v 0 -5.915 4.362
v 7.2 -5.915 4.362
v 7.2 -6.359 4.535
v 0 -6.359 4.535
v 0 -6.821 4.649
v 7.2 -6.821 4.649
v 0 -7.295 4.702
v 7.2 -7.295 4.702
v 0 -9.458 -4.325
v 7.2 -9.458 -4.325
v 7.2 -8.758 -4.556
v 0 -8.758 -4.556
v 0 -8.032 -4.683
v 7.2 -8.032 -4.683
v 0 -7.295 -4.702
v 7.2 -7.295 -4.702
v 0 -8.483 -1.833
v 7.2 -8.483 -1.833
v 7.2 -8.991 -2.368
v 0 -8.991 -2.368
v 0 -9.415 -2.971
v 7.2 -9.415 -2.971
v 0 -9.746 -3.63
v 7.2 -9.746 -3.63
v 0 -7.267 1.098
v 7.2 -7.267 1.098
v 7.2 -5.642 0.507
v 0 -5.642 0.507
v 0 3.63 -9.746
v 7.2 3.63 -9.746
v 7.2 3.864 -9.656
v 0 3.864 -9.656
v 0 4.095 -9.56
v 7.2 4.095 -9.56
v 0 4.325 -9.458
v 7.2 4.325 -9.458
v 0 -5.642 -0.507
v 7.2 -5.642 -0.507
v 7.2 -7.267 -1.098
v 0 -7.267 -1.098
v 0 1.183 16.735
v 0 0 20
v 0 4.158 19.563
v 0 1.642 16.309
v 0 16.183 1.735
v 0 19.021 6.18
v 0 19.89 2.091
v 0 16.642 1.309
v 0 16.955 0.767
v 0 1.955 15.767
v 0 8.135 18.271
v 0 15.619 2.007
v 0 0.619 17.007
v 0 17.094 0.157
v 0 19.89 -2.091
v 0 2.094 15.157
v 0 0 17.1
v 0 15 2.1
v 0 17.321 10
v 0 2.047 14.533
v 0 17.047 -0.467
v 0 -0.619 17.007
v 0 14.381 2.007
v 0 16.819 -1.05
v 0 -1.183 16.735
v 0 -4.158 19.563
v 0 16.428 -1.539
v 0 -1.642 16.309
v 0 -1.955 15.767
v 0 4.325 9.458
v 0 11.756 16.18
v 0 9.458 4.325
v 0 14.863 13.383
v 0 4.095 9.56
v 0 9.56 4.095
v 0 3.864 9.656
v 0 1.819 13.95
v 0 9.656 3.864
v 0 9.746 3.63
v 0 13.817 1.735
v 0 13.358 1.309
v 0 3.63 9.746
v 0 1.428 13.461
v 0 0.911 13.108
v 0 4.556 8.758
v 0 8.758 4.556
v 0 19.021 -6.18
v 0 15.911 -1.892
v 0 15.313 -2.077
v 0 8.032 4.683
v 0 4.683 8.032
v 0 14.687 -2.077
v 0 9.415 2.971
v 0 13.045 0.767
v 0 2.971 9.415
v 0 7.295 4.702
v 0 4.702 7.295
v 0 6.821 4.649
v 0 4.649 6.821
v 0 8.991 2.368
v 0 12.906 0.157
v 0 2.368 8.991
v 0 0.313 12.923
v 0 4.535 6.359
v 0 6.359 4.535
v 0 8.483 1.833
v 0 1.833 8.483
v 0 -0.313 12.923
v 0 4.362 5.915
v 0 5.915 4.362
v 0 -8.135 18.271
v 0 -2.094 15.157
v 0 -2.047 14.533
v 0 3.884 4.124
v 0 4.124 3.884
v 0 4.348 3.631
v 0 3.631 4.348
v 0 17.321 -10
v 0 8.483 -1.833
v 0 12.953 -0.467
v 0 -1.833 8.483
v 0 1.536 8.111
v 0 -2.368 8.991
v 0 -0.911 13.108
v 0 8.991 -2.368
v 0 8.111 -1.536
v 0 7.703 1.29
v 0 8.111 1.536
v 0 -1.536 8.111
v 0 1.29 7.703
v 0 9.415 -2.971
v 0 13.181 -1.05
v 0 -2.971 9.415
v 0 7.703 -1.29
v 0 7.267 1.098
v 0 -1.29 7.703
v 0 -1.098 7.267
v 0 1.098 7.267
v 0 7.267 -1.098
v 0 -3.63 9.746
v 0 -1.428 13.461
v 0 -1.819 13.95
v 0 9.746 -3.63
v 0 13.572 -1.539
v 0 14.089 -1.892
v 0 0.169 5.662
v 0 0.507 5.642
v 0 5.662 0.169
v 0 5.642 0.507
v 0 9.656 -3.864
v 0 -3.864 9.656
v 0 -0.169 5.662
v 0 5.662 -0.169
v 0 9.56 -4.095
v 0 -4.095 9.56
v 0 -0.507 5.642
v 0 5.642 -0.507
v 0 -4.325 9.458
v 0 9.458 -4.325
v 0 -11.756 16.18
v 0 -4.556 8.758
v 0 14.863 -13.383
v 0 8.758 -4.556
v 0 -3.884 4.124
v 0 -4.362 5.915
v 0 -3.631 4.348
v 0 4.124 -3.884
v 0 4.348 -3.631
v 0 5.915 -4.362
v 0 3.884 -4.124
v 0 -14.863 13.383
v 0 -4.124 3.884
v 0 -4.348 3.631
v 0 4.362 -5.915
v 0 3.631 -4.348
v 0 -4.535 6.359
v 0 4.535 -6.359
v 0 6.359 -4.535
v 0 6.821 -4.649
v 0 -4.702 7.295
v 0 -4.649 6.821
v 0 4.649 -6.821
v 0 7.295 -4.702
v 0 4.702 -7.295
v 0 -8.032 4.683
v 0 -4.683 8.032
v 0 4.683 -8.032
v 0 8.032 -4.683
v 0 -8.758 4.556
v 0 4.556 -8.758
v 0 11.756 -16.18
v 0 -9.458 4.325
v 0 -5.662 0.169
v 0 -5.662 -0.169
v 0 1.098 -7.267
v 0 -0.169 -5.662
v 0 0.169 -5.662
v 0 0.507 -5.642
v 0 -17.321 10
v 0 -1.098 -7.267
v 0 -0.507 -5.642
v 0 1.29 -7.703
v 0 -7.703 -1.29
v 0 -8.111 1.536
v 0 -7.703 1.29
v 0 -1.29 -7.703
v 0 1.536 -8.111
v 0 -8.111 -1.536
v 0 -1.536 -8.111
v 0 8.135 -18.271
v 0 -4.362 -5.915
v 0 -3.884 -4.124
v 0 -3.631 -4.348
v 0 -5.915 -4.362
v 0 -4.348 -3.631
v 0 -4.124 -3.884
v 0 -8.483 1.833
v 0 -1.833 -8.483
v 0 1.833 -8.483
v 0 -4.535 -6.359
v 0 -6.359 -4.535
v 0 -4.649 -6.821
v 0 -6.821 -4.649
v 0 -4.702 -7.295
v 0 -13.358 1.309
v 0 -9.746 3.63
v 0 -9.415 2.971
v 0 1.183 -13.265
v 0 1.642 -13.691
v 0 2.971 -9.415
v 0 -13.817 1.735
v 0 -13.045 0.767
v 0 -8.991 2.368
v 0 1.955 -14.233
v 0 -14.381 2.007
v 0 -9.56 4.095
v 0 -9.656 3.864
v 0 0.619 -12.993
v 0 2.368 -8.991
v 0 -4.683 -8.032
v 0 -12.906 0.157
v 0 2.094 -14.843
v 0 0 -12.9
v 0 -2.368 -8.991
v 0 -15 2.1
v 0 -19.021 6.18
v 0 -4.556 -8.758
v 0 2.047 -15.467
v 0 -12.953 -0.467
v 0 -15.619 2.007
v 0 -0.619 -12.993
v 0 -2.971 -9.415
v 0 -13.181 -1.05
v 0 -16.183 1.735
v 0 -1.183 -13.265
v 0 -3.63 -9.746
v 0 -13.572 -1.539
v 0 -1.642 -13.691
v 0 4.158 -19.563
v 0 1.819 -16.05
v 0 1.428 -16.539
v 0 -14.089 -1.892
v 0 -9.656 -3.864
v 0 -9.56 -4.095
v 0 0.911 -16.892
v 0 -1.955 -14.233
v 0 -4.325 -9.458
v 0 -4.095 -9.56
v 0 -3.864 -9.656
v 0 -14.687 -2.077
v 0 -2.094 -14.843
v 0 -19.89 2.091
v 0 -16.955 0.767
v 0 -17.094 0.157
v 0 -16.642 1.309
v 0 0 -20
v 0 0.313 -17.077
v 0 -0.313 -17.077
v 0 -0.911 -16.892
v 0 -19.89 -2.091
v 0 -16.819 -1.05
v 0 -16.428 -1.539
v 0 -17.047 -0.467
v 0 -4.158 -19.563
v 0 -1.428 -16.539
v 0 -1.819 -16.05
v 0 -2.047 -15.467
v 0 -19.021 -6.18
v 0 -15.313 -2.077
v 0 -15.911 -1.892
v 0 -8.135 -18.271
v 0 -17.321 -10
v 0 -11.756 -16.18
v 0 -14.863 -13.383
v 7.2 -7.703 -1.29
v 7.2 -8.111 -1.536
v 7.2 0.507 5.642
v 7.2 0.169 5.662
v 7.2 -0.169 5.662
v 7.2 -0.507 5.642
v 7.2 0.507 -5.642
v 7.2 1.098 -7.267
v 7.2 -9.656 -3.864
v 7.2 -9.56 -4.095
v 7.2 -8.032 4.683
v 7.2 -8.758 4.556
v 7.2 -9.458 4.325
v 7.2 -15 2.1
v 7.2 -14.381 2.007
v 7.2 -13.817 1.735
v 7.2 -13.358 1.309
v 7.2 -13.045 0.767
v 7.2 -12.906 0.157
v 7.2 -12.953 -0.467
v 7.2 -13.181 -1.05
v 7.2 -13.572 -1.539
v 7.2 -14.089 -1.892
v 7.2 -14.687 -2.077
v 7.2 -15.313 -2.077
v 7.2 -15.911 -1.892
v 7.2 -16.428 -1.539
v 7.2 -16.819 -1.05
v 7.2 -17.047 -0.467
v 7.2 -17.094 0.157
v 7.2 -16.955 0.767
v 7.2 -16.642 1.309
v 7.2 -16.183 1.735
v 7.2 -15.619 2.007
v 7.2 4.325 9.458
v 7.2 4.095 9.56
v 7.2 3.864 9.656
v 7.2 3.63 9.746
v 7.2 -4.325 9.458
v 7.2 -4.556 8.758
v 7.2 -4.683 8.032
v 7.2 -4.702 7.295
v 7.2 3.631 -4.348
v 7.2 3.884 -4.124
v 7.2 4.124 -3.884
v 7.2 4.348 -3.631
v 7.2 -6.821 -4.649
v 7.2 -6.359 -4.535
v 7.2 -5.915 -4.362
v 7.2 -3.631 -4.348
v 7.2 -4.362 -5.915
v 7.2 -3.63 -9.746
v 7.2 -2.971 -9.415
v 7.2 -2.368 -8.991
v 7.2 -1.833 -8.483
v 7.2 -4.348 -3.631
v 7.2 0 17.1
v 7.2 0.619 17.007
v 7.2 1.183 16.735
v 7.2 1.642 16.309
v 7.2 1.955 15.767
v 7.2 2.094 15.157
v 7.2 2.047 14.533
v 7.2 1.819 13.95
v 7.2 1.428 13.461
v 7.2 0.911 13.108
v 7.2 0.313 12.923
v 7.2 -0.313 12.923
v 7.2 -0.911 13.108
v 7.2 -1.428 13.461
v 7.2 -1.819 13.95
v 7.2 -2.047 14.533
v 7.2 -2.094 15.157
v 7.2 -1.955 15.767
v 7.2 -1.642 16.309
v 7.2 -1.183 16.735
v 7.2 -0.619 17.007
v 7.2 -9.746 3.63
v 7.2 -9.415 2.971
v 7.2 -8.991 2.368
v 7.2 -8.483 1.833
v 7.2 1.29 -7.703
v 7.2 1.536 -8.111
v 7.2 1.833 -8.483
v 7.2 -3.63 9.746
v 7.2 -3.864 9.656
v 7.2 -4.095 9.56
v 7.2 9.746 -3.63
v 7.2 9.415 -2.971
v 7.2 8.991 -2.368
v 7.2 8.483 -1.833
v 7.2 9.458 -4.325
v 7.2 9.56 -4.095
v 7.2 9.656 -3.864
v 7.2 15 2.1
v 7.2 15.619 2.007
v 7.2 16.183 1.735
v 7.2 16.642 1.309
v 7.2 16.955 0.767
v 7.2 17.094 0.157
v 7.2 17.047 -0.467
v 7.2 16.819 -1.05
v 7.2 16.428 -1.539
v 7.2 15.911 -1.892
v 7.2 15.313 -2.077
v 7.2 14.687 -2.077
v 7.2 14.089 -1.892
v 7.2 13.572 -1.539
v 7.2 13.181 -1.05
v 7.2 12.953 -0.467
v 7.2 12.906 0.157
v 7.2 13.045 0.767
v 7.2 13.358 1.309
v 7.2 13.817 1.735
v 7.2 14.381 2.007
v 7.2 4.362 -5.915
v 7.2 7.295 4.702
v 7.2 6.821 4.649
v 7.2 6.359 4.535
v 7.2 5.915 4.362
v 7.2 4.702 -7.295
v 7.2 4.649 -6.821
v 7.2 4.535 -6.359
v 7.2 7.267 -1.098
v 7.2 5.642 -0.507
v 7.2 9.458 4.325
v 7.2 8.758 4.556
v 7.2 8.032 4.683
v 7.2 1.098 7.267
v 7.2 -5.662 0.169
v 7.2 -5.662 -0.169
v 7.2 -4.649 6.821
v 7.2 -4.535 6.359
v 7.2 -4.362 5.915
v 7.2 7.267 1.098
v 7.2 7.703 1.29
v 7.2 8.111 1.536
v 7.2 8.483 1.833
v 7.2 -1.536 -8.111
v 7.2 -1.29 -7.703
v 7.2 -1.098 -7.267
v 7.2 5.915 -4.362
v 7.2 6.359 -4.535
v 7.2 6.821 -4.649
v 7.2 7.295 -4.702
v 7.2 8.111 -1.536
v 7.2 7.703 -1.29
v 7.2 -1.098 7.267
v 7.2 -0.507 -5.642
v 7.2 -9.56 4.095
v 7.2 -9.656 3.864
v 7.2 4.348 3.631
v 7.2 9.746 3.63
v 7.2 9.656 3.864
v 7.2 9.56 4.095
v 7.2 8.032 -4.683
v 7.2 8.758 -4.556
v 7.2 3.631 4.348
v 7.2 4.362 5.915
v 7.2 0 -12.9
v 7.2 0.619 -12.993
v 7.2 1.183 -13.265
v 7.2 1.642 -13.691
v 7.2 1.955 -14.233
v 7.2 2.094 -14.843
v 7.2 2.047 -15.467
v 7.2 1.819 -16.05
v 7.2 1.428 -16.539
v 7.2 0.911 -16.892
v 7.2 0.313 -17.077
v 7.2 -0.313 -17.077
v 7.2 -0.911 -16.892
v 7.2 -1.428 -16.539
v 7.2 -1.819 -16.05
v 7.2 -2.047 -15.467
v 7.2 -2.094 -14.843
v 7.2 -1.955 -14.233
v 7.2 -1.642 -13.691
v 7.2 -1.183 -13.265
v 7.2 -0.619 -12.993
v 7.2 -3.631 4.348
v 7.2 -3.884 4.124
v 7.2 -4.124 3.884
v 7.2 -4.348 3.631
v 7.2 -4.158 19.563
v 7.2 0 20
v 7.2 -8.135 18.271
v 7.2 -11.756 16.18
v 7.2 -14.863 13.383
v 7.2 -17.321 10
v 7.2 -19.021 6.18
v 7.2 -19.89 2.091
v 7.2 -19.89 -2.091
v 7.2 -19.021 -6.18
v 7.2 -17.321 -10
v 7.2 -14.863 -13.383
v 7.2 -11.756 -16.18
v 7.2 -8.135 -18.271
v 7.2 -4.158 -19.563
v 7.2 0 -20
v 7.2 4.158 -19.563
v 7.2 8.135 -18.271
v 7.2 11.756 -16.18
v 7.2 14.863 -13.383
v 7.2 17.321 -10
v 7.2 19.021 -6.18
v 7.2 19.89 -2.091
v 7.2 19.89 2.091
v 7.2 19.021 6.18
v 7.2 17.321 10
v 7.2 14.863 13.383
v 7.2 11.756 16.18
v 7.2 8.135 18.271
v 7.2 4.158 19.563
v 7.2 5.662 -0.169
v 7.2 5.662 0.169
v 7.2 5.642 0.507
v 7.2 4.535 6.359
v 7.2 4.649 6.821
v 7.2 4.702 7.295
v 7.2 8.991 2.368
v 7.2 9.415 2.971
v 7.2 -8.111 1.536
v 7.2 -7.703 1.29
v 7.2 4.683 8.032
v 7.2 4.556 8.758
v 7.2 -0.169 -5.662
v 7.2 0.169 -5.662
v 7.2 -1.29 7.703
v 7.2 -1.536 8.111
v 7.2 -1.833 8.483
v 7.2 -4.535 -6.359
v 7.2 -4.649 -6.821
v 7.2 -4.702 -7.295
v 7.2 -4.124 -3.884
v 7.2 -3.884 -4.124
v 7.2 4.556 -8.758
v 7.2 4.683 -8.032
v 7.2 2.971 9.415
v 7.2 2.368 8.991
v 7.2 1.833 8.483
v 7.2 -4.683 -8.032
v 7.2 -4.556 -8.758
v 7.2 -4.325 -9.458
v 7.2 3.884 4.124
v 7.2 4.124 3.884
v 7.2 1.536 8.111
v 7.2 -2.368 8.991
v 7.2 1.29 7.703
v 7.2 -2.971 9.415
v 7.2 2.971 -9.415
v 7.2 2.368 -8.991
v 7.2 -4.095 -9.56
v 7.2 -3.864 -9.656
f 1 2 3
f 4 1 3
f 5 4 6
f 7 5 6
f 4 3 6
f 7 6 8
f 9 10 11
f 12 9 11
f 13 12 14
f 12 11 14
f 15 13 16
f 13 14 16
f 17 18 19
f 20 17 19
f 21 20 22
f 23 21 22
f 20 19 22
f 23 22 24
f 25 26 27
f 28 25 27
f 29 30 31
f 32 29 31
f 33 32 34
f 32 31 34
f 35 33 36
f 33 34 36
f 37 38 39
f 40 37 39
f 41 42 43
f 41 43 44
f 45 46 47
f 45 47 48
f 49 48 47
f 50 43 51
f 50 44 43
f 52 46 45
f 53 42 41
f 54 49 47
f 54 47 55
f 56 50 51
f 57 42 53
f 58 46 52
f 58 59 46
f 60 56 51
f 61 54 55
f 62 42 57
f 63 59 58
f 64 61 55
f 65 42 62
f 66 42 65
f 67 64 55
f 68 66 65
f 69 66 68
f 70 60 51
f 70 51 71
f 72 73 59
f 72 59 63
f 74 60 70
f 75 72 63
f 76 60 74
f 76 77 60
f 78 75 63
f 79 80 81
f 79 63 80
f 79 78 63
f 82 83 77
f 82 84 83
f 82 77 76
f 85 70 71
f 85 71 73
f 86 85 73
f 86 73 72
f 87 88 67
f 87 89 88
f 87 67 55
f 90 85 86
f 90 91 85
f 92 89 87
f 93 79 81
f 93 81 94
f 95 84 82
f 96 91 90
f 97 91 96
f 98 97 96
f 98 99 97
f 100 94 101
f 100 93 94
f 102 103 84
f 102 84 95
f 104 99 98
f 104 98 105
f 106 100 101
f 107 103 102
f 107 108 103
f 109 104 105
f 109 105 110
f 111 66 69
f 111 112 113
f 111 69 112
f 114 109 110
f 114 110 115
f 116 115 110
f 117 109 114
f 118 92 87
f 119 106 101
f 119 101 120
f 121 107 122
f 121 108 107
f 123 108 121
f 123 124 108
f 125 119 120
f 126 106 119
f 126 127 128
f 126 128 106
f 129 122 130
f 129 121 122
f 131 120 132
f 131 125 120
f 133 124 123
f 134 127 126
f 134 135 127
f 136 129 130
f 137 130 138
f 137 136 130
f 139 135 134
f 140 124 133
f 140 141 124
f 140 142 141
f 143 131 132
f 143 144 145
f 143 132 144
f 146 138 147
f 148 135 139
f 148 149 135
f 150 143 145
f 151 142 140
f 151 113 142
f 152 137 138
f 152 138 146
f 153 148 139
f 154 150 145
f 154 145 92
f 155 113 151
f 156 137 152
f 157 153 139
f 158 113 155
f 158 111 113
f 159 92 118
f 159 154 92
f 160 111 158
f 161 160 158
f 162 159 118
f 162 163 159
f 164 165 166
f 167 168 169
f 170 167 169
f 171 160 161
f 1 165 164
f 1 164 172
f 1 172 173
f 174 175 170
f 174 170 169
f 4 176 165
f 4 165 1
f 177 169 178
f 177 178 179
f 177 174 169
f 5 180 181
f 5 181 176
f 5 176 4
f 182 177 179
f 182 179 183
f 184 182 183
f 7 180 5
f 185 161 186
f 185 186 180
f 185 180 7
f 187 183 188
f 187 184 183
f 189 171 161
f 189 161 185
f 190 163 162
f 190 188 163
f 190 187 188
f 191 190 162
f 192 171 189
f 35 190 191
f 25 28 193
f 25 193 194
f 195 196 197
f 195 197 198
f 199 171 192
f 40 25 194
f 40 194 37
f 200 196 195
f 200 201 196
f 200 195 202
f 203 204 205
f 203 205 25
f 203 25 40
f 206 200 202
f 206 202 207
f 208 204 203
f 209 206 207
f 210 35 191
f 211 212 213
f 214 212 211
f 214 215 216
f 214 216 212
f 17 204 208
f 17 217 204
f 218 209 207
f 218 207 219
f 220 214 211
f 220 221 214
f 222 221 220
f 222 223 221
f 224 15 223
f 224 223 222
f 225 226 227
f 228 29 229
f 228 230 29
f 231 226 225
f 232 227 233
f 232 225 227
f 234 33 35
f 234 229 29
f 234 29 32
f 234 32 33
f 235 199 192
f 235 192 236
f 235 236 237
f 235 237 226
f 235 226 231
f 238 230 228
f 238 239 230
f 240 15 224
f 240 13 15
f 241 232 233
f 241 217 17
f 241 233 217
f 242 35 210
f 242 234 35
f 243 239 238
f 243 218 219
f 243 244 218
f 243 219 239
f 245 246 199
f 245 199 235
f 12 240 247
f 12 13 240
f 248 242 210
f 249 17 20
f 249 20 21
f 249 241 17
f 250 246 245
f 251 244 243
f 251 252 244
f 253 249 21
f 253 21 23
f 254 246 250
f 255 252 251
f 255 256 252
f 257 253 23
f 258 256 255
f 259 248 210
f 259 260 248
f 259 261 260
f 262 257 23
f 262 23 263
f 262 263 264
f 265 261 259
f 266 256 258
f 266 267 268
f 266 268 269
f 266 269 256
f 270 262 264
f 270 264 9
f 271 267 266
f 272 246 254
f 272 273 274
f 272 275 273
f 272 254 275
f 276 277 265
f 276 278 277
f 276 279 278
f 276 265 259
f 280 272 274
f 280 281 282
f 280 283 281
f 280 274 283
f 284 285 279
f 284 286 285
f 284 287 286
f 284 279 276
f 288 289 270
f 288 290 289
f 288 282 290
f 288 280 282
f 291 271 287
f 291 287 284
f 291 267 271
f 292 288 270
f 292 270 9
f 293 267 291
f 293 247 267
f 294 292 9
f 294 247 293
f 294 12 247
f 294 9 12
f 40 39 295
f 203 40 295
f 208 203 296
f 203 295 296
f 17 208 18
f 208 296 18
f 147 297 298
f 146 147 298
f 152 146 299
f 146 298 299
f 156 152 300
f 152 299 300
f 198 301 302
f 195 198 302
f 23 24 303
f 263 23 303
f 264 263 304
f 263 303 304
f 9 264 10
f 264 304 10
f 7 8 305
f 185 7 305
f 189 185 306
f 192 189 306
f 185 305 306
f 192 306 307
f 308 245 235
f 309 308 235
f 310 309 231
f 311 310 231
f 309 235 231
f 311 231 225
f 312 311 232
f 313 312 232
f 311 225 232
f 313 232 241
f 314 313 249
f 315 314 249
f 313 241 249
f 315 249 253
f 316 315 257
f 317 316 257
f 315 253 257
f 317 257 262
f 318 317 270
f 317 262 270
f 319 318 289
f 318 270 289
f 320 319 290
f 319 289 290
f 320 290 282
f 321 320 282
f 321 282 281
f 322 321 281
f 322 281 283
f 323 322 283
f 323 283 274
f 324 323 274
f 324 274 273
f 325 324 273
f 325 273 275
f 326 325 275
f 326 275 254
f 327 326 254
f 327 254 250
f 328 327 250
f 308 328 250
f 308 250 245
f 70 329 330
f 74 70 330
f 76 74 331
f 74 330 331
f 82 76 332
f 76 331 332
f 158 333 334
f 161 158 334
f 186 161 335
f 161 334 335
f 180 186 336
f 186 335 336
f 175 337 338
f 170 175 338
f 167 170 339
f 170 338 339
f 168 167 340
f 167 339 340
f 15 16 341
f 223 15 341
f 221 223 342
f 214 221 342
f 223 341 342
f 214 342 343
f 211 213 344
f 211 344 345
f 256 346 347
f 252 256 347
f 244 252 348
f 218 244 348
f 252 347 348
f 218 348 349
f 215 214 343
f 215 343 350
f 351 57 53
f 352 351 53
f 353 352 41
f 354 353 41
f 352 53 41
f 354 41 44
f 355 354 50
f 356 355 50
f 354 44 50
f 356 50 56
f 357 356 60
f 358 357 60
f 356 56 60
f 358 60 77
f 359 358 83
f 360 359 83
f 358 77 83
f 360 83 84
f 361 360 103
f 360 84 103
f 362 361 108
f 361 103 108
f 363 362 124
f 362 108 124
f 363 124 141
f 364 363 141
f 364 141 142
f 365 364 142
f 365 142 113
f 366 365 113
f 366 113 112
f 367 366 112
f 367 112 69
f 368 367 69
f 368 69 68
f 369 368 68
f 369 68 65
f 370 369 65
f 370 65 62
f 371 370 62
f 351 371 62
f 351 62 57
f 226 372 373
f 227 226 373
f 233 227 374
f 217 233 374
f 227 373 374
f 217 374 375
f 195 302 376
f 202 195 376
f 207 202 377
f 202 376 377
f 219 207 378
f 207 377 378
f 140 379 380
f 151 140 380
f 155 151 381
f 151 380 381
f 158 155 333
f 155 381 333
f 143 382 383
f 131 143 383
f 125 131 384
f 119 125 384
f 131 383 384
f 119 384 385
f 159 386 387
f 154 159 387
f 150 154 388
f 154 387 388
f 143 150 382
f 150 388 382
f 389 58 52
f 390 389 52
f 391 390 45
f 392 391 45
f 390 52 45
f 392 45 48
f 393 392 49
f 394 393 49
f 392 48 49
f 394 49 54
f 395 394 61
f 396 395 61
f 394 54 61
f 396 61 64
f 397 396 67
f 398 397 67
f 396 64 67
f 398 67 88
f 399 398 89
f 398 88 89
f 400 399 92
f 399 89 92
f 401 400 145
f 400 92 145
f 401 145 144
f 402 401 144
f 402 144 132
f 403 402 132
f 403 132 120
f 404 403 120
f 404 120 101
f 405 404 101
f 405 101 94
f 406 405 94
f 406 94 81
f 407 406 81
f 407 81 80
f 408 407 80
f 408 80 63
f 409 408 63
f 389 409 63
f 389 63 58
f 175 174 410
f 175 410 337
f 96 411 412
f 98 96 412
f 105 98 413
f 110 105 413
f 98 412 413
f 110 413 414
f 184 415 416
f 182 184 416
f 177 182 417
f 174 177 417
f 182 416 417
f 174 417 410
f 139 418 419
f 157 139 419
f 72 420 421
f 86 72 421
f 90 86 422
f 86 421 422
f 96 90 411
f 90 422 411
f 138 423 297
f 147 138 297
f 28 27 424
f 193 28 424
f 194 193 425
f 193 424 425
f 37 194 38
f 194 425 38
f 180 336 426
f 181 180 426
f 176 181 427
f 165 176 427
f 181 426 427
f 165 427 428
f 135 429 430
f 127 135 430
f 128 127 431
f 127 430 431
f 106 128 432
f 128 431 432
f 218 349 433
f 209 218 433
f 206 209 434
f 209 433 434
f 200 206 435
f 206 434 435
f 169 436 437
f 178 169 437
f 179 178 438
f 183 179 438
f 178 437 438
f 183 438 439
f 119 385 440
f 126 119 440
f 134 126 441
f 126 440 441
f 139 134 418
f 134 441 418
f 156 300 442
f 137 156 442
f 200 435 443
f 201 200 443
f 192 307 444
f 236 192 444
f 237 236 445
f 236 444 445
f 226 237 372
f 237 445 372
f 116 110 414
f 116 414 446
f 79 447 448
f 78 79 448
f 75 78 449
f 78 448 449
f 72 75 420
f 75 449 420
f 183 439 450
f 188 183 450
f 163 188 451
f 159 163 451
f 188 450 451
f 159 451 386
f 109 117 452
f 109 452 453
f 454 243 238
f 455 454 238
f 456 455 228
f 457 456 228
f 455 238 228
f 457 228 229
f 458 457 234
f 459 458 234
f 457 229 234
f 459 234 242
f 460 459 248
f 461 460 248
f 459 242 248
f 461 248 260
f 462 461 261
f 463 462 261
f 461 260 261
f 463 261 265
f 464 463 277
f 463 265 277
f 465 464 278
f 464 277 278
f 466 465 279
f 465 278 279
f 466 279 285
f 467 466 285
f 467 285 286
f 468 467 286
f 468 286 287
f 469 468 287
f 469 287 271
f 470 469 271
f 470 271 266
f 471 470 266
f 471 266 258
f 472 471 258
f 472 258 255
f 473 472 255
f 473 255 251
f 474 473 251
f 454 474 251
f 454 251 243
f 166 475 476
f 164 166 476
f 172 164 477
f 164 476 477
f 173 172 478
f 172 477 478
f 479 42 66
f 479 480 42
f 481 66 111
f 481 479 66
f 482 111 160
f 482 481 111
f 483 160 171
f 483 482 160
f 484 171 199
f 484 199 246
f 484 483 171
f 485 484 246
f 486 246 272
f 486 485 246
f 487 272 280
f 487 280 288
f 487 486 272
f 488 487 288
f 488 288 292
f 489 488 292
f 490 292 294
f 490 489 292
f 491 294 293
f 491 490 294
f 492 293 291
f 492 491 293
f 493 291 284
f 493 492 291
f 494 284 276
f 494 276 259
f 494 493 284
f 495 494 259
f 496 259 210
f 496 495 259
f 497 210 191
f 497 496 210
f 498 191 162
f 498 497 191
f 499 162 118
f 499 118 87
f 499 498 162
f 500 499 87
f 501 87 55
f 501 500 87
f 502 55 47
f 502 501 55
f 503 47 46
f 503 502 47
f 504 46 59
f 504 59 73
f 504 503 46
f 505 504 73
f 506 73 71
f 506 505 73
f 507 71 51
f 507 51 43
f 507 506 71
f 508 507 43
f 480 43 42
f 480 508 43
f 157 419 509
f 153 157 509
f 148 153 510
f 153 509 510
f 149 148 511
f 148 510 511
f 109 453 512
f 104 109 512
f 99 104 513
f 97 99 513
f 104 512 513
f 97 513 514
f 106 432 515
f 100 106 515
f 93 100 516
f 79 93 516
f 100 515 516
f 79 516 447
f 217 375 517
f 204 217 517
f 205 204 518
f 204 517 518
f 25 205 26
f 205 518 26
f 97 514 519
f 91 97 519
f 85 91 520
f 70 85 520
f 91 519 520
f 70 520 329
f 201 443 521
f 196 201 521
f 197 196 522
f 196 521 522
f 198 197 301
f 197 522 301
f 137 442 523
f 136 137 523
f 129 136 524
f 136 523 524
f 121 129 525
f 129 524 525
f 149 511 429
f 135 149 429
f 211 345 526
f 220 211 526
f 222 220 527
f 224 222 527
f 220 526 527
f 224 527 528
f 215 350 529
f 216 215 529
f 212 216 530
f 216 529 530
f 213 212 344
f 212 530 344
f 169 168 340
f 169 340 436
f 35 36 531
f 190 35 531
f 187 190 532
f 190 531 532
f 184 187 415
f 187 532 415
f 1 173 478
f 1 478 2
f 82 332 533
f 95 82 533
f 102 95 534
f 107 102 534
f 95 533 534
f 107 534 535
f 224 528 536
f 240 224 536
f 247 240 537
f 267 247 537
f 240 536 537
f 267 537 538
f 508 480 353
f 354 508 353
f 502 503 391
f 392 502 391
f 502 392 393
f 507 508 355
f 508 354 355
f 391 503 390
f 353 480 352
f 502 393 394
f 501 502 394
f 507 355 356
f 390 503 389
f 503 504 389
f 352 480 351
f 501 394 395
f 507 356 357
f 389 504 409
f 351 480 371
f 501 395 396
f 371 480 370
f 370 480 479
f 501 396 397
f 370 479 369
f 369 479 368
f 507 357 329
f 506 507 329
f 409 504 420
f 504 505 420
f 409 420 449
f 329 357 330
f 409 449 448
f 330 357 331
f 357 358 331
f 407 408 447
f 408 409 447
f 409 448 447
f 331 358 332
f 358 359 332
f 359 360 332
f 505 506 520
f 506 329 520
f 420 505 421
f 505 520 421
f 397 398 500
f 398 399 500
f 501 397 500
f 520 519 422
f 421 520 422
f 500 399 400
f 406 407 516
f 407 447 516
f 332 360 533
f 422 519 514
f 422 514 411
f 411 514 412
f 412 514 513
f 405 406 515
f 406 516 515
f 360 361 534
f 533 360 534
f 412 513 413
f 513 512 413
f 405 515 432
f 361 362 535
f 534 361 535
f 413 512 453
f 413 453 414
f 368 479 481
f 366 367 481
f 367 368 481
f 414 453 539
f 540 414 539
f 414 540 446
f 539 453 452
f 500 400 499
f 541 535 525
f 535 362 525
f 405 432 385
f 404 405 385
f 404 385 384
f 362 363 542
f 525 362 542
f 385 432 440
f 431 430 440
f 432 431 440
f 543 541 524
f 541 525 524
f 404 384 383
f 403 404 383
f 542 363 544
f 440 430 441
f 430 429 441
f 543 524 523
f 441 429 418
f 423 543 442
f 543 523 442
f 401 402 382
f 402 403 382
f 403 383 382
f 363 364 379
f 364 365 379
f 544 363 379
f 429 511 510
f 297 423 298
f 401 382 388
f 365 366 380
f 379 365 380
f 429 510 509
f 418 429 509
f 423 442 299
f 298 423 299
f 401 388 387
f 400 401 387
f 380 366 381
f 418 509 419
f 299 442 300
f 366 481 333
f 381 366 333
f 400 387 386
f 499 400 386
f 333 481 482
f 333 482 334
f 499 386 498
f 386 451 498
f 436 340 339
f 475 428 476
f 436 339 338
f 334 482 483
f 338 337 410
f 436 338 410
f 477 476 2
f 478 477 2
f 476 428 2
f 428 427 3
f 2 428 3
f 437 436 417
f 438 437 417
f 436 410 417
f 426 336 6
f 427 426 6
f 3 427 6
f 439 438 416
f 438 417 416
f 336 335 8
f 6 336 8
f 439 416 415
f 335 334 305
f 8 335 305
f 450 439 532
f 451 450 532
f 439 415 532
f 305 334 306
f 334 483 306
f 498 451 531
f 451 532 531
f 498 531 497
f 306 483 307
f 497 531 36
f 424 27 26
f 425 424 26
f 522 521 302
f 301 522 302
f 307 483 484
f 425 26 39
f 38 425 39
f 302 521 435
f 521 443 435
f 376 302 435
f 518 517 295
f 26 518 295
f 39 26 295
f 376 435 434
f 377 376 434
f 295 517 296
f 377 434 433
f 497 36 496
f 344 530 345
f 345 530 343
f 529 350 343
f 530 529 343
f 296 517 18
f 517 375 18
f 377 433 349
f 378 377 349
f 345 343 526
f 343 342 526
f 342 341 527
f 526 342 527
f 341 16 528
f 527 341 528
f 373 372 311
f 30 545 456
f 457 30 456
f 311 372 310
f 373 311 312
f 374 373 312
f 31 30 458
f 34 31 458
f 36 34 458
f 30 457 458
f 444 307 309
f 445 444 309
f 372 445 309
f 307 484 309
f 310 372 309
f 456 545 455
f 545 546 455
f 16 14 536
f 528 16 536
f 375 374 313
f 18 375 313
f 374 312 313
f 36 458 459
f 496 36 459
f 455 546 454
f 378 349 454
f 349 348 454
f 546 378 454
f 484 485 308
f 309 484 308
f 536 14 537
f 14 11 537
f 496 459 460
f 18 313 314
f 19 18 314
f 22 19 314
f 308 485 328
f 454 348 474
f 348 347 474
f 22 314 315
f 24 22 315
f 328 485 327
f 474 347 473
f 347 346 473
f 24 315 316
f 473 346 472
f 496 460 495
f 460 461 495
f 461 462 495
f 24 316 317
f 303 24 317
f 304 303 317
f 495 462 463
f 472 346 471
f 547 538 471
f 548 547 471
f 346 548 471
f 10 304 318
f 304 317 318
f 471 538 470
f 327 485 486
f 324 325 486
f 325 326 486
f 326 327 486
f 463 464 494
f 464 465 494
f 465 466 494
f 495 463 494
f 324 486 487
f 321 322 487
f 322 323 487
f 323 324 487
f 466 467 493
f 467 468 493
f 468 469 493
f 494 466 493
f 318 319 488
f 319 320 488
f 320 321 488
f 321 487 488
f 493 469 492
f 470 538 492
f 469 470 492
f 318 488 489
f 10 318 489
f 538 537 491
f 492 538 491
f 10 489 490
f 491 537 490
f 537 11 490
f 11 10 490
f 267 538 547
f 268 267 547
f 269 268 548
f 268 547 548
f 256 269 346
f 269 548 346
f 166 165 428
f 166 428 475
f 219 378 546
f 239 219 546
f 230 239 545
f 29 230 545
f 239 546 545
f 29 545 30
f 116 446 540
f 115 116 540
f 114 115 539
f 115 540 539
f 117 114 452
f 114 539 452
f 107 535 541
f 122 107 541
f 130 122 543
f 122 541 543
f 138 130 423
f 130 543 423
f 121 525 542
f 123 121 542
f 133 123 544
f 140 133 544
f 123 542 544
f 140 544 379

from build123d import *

# Parameters (mm, degrees)
ESBO_O1_W             = 7.2
ESBO_O1_H             = 20
CORTE_EXTRUS_O2_DEPTH = 30.186298155
FURO_ROSCADO_DE_M51_D = 4.2


with BuildPart() as part:
    # Esboço1 → Revolução1 (revolve)
    with BuildSketch(Plane.XY, mode=Mode.PRIVATE) as revolu_o1_sk:
        with Locations((3.6, 10)):
            Rectangle(ESBO_O1_W, ESBO_O1_H)
    revolve(revolu_o1_sk.sketch.rotate(Axis((-35, 0, 0), (1, 0, 0)), 90), axis=Axis((-35, 0, 0), (1, 0, 0)))

    # Esboço3 → Corte-extrusão2 (cut, through all)
    with BuildSketch(Plane(origin=(7.2, 0, 0), x_dir=(0, 0, -1), z_dir=(1, 0, 0))):
        with BuildLine():
            Line((-0.506751832, 5.642289215), (-1.097919721, 7.266509641))
            ThreePointArc((-1.097919721, 7.266509641), (-1.406126414, 7.910707201), (-1.832951119, 8.483247621))
            ThreePointArc((-1.832951119, 8.483247621), (-2.661618953, 9.214061597), (-3.630088541, 9.745894376))
            ThreePointArc((-3.630088541, 9.745894376), (-3.979907697, 9.608347138), (-4.324527778, 9.458248225))
            ThreePointArc((-4.324527778, 9.458248225), (-4.633276627, 8.397374248), (-4.702469753, 7.294654085))
            ThreePointArc((-4.702469753, 7.294654085), (-4.599433183, 6.587996228), (-4.361851763, 5.914544723))
            Line((-4.361851763, 5.914544723), (-3.631373309, 4.348028622))
            ThreePointArc((-3.631373309, 4.348028622), (-4.005759915, 4.005759915), (-4.348028622, 3.631373309))
            Line((-4.348028622, 3.631373309), (-5.914544723, 4.361851763))
            ThreePointArc((-5.914544723, 4.361851763), (-6.587996228, 4.599433183), (-7.294654085, 4.702469753))
            ThreePointArc((-7.294654085, 4.702469753), (-8.397374248, 4.633276627), (-9.458248225, 4.324527778))
            ThreePointArc((-9.458248225, 4.324527778), (-9.608347138, 3.979907697), (-9.745894376, 3.630088541))
            ThreePointArc((-9.745894376, 3.630088541), (-9.214061597, 2.661618953), (-8.483247621, 1.832951119))
            ThreePointArc((-8.483247621, 1.832951119), (-7.910707201, 1.406126414), (-7.266509641, 1.097919721))
            Line((-7.266509641, 1.097919721), (-5.642289215, 0.506751832))
            ThreePointArc((-5.642289215, 0.506751832), (-5.665, 0), (-5.642289215, -0.506751832))
            Line((-5.642289215, -0.506751832), (-7.266509641, -1.097919721))
            ThreePointArc((-7.266509641, -1.097919721), (-7.910707201, -1.406126414), (-8.483247621, -1.832951119))
            ThreePointArc((-8.483247621, -1.832951119), (-9.214061597, -2.661618953), (-9.745894376, -3.630088541))
            ThreePointArc((-9.745894376, -3.630088541), (-9.608347138, -3.979907697), (-9.458248225, -4.324527778))
            ThreePointArc((-9.458248225, -4.324527778), (-8.397374248, -4.633276627), (-7.294654085, -4.702469753))
            ThreePointArc((-7.294654085, -4.702469753), (-6.587996228, -4.599433183), (-5.914544723, -4.361851763))
            Line((-5.914544723, -4.361851763), (-4.348028622, -3.631373309))
            ThreePointArc((-4.348028622, -3.631373309), (-4.005759915, -4.005759915), (-3.631373309, -4.348028622))
            Line((-3.631373309, -4.348028622), (-4.361851763, -5.914544723))
            ThreePointArc((-4.361851763, -5.914544723), (-4.599433183, -6.587996228), (-4.702469753, -7.294654085))
            ThreePointArc((-4.702469753, -7.294654085), (-4.633276627, -8.397374248), (-4.324527778, -9.458248225))
            ThreePointArc((-4.324527778, -9.458248225), (-3.979907697, -9.608347138), (-3.630088541, -9.745894376))
            ThreePointArc((-3.630088541, -9.745894376), (-2.661618953, -9.214061597), (-1.832951119, -8.483247621))
            ThreePointArc((-1.832951119, -8.483247621), (-1.406126414, -7.910707201), (-1.097919721, -7.266509641))
            Line((-1.097919721, -7.266509641), (-0.506751832, -5.642289215))
            ThreePointArc((-0.506751832, -5.642289215), (0, -5.665), (0.506751832, -5.642289215))
            Line((0.506751832, -5.642289215), (1.097919721, -7.266509641))
            ThreePointArc((1.097919721, -7.266509641), (1.406126414, -7.910707201), (1.832951119, -8.483247621))
            ThreePointArc((1.832951119, -8.483247621), (2.661618953, -9.214061597), (3.630088541, -9.745894376))
            ThreePointArc((3.630088541, -9.745894376), (3.979907697, -9.608347138), (4.324527778, -9.458248225))
            ThreePointArc((4.324527778, -9.458248225), (4.633276627, -8.397374248), (4.702469753, -7.294654085))
            ThreePointArc((4.702469753, -7.294654085), (4.599433183, -6.587996228), (4.361851763, -5.914544723))
            Line((4.361851763, -5.914544723), (3.631373309, -4.348028622))
            ThreePointArc((3.631373309, -4.348028622), (4.005759915, -4.005759915), (4.348028622, -3.631373309))
            Line((4.348028622, -3.631373309), (5.914544723, -4.361851763))
            ThreePointArc((5.914544723, -4.361851763), (6.587996228, -4.599433183), (7.294654085, -4.702469753))
            ThreePointArc((7.294654085, -4.702469753), (8.397374248, -4.633276627), (9.458248225, -4.324527778))
            ThreePointArc((9.458248225, -4.324527778), (9.608347138, -3.979907697), (9.745894376, -3.630088541))
            ThreePointArc((9.745894376, -3.630088541), (9.214061597, -2.661618953), (8.483247621, -1.832951119))
            ThreePointArc((8.483247621, -1.832951119), (7.910707201, -1.406126414), (7.266509641, -1.097919721))
            Line((7.266509641, -1.097919721), (5.642289215, -0.506751832))
            ThreePointArc((5.642289215, -0.506751832), (5.665, 0), (5.642289215, 0.506751832))
            Line((5.642289215, 0.506751832), (7.266509641, 1.097919721))
            ThreePointArc((7.266509641, 1.097919721), (7.910707201, 1.406126414), (8.483247621, 1.832951119))
            ThreePointArc((8.483247621, 1.832951119), (9.214061597, 2.661618953), (9.745894376, 3.630088541))
            ThreePointArc((9.745894376, 3.630088541), (9.608347138, 3.979907697), (9.458248225, 4.324527778))
            ThreePointArc((9.458248225, 4.324527778), (8.397374248, 4.633276627), (7.294654085, 4.702469753))
            ThreePointArc((7.294654085, 4.702469753), (6.587996228, 4.599433183), (5.914544723, 4.361851763))
            Line((5.914544723, 4.361851763), (4.348028622, 3.631373309))
            ThreePointArc((4.348028622, 3.631373309), (4.005759915, 4.005759915), (3.631373309, 4.348028622))
            Line((3.631373309, 4.348028622), (4.361851763, 5.914544723))
            ThreePointArc((4.361851763, 5.914544723), (4.599433183, 6.587996228), (4.702469753, 7.294654085))
            ThreePointArc((4.702469753, 7.294654085), (4.633276627, 8.397374248), (4.324527778, 9.458248225))
            ThreePointArc((4.324527778, 9.458248225), (3.979907697, 9.608347138), (3.630088541, 9.745894376))
            ThreePointArc((3.630088541, 9.745894376), (2.661618953, 9.214061597), (1.832951119, 8.483247621))
            ThreePointArc((1.832951119, 8.483247621), (1.406126414, 7.910707201), (1.097919721, 7.266509641))
            Line((1.097919721, 7.266509641), (0.506751832, 5.642289215))
            ThreePointArc((0.506751832, 5.642289215), (0, 5.665), (-0.506751832, 5.642289215))
        make_face()
    extrude(amount=-CORTE_EXTRUS_O2_DEPTH, mode=Mode.SUBTRACT)

    # Furo roscado de M51 (through all)
    with Locations(Plane(origin=(7.2, 0, 0), x_dir=(0, 0, -1), z_dir=(1, 0, 0))):
        with Locations((0, 15), (15, 0), (0, -15), (-15, 0)):
            Hole(FURO_ROSCADO_DE_M51_D / 2)


solid = part.part
